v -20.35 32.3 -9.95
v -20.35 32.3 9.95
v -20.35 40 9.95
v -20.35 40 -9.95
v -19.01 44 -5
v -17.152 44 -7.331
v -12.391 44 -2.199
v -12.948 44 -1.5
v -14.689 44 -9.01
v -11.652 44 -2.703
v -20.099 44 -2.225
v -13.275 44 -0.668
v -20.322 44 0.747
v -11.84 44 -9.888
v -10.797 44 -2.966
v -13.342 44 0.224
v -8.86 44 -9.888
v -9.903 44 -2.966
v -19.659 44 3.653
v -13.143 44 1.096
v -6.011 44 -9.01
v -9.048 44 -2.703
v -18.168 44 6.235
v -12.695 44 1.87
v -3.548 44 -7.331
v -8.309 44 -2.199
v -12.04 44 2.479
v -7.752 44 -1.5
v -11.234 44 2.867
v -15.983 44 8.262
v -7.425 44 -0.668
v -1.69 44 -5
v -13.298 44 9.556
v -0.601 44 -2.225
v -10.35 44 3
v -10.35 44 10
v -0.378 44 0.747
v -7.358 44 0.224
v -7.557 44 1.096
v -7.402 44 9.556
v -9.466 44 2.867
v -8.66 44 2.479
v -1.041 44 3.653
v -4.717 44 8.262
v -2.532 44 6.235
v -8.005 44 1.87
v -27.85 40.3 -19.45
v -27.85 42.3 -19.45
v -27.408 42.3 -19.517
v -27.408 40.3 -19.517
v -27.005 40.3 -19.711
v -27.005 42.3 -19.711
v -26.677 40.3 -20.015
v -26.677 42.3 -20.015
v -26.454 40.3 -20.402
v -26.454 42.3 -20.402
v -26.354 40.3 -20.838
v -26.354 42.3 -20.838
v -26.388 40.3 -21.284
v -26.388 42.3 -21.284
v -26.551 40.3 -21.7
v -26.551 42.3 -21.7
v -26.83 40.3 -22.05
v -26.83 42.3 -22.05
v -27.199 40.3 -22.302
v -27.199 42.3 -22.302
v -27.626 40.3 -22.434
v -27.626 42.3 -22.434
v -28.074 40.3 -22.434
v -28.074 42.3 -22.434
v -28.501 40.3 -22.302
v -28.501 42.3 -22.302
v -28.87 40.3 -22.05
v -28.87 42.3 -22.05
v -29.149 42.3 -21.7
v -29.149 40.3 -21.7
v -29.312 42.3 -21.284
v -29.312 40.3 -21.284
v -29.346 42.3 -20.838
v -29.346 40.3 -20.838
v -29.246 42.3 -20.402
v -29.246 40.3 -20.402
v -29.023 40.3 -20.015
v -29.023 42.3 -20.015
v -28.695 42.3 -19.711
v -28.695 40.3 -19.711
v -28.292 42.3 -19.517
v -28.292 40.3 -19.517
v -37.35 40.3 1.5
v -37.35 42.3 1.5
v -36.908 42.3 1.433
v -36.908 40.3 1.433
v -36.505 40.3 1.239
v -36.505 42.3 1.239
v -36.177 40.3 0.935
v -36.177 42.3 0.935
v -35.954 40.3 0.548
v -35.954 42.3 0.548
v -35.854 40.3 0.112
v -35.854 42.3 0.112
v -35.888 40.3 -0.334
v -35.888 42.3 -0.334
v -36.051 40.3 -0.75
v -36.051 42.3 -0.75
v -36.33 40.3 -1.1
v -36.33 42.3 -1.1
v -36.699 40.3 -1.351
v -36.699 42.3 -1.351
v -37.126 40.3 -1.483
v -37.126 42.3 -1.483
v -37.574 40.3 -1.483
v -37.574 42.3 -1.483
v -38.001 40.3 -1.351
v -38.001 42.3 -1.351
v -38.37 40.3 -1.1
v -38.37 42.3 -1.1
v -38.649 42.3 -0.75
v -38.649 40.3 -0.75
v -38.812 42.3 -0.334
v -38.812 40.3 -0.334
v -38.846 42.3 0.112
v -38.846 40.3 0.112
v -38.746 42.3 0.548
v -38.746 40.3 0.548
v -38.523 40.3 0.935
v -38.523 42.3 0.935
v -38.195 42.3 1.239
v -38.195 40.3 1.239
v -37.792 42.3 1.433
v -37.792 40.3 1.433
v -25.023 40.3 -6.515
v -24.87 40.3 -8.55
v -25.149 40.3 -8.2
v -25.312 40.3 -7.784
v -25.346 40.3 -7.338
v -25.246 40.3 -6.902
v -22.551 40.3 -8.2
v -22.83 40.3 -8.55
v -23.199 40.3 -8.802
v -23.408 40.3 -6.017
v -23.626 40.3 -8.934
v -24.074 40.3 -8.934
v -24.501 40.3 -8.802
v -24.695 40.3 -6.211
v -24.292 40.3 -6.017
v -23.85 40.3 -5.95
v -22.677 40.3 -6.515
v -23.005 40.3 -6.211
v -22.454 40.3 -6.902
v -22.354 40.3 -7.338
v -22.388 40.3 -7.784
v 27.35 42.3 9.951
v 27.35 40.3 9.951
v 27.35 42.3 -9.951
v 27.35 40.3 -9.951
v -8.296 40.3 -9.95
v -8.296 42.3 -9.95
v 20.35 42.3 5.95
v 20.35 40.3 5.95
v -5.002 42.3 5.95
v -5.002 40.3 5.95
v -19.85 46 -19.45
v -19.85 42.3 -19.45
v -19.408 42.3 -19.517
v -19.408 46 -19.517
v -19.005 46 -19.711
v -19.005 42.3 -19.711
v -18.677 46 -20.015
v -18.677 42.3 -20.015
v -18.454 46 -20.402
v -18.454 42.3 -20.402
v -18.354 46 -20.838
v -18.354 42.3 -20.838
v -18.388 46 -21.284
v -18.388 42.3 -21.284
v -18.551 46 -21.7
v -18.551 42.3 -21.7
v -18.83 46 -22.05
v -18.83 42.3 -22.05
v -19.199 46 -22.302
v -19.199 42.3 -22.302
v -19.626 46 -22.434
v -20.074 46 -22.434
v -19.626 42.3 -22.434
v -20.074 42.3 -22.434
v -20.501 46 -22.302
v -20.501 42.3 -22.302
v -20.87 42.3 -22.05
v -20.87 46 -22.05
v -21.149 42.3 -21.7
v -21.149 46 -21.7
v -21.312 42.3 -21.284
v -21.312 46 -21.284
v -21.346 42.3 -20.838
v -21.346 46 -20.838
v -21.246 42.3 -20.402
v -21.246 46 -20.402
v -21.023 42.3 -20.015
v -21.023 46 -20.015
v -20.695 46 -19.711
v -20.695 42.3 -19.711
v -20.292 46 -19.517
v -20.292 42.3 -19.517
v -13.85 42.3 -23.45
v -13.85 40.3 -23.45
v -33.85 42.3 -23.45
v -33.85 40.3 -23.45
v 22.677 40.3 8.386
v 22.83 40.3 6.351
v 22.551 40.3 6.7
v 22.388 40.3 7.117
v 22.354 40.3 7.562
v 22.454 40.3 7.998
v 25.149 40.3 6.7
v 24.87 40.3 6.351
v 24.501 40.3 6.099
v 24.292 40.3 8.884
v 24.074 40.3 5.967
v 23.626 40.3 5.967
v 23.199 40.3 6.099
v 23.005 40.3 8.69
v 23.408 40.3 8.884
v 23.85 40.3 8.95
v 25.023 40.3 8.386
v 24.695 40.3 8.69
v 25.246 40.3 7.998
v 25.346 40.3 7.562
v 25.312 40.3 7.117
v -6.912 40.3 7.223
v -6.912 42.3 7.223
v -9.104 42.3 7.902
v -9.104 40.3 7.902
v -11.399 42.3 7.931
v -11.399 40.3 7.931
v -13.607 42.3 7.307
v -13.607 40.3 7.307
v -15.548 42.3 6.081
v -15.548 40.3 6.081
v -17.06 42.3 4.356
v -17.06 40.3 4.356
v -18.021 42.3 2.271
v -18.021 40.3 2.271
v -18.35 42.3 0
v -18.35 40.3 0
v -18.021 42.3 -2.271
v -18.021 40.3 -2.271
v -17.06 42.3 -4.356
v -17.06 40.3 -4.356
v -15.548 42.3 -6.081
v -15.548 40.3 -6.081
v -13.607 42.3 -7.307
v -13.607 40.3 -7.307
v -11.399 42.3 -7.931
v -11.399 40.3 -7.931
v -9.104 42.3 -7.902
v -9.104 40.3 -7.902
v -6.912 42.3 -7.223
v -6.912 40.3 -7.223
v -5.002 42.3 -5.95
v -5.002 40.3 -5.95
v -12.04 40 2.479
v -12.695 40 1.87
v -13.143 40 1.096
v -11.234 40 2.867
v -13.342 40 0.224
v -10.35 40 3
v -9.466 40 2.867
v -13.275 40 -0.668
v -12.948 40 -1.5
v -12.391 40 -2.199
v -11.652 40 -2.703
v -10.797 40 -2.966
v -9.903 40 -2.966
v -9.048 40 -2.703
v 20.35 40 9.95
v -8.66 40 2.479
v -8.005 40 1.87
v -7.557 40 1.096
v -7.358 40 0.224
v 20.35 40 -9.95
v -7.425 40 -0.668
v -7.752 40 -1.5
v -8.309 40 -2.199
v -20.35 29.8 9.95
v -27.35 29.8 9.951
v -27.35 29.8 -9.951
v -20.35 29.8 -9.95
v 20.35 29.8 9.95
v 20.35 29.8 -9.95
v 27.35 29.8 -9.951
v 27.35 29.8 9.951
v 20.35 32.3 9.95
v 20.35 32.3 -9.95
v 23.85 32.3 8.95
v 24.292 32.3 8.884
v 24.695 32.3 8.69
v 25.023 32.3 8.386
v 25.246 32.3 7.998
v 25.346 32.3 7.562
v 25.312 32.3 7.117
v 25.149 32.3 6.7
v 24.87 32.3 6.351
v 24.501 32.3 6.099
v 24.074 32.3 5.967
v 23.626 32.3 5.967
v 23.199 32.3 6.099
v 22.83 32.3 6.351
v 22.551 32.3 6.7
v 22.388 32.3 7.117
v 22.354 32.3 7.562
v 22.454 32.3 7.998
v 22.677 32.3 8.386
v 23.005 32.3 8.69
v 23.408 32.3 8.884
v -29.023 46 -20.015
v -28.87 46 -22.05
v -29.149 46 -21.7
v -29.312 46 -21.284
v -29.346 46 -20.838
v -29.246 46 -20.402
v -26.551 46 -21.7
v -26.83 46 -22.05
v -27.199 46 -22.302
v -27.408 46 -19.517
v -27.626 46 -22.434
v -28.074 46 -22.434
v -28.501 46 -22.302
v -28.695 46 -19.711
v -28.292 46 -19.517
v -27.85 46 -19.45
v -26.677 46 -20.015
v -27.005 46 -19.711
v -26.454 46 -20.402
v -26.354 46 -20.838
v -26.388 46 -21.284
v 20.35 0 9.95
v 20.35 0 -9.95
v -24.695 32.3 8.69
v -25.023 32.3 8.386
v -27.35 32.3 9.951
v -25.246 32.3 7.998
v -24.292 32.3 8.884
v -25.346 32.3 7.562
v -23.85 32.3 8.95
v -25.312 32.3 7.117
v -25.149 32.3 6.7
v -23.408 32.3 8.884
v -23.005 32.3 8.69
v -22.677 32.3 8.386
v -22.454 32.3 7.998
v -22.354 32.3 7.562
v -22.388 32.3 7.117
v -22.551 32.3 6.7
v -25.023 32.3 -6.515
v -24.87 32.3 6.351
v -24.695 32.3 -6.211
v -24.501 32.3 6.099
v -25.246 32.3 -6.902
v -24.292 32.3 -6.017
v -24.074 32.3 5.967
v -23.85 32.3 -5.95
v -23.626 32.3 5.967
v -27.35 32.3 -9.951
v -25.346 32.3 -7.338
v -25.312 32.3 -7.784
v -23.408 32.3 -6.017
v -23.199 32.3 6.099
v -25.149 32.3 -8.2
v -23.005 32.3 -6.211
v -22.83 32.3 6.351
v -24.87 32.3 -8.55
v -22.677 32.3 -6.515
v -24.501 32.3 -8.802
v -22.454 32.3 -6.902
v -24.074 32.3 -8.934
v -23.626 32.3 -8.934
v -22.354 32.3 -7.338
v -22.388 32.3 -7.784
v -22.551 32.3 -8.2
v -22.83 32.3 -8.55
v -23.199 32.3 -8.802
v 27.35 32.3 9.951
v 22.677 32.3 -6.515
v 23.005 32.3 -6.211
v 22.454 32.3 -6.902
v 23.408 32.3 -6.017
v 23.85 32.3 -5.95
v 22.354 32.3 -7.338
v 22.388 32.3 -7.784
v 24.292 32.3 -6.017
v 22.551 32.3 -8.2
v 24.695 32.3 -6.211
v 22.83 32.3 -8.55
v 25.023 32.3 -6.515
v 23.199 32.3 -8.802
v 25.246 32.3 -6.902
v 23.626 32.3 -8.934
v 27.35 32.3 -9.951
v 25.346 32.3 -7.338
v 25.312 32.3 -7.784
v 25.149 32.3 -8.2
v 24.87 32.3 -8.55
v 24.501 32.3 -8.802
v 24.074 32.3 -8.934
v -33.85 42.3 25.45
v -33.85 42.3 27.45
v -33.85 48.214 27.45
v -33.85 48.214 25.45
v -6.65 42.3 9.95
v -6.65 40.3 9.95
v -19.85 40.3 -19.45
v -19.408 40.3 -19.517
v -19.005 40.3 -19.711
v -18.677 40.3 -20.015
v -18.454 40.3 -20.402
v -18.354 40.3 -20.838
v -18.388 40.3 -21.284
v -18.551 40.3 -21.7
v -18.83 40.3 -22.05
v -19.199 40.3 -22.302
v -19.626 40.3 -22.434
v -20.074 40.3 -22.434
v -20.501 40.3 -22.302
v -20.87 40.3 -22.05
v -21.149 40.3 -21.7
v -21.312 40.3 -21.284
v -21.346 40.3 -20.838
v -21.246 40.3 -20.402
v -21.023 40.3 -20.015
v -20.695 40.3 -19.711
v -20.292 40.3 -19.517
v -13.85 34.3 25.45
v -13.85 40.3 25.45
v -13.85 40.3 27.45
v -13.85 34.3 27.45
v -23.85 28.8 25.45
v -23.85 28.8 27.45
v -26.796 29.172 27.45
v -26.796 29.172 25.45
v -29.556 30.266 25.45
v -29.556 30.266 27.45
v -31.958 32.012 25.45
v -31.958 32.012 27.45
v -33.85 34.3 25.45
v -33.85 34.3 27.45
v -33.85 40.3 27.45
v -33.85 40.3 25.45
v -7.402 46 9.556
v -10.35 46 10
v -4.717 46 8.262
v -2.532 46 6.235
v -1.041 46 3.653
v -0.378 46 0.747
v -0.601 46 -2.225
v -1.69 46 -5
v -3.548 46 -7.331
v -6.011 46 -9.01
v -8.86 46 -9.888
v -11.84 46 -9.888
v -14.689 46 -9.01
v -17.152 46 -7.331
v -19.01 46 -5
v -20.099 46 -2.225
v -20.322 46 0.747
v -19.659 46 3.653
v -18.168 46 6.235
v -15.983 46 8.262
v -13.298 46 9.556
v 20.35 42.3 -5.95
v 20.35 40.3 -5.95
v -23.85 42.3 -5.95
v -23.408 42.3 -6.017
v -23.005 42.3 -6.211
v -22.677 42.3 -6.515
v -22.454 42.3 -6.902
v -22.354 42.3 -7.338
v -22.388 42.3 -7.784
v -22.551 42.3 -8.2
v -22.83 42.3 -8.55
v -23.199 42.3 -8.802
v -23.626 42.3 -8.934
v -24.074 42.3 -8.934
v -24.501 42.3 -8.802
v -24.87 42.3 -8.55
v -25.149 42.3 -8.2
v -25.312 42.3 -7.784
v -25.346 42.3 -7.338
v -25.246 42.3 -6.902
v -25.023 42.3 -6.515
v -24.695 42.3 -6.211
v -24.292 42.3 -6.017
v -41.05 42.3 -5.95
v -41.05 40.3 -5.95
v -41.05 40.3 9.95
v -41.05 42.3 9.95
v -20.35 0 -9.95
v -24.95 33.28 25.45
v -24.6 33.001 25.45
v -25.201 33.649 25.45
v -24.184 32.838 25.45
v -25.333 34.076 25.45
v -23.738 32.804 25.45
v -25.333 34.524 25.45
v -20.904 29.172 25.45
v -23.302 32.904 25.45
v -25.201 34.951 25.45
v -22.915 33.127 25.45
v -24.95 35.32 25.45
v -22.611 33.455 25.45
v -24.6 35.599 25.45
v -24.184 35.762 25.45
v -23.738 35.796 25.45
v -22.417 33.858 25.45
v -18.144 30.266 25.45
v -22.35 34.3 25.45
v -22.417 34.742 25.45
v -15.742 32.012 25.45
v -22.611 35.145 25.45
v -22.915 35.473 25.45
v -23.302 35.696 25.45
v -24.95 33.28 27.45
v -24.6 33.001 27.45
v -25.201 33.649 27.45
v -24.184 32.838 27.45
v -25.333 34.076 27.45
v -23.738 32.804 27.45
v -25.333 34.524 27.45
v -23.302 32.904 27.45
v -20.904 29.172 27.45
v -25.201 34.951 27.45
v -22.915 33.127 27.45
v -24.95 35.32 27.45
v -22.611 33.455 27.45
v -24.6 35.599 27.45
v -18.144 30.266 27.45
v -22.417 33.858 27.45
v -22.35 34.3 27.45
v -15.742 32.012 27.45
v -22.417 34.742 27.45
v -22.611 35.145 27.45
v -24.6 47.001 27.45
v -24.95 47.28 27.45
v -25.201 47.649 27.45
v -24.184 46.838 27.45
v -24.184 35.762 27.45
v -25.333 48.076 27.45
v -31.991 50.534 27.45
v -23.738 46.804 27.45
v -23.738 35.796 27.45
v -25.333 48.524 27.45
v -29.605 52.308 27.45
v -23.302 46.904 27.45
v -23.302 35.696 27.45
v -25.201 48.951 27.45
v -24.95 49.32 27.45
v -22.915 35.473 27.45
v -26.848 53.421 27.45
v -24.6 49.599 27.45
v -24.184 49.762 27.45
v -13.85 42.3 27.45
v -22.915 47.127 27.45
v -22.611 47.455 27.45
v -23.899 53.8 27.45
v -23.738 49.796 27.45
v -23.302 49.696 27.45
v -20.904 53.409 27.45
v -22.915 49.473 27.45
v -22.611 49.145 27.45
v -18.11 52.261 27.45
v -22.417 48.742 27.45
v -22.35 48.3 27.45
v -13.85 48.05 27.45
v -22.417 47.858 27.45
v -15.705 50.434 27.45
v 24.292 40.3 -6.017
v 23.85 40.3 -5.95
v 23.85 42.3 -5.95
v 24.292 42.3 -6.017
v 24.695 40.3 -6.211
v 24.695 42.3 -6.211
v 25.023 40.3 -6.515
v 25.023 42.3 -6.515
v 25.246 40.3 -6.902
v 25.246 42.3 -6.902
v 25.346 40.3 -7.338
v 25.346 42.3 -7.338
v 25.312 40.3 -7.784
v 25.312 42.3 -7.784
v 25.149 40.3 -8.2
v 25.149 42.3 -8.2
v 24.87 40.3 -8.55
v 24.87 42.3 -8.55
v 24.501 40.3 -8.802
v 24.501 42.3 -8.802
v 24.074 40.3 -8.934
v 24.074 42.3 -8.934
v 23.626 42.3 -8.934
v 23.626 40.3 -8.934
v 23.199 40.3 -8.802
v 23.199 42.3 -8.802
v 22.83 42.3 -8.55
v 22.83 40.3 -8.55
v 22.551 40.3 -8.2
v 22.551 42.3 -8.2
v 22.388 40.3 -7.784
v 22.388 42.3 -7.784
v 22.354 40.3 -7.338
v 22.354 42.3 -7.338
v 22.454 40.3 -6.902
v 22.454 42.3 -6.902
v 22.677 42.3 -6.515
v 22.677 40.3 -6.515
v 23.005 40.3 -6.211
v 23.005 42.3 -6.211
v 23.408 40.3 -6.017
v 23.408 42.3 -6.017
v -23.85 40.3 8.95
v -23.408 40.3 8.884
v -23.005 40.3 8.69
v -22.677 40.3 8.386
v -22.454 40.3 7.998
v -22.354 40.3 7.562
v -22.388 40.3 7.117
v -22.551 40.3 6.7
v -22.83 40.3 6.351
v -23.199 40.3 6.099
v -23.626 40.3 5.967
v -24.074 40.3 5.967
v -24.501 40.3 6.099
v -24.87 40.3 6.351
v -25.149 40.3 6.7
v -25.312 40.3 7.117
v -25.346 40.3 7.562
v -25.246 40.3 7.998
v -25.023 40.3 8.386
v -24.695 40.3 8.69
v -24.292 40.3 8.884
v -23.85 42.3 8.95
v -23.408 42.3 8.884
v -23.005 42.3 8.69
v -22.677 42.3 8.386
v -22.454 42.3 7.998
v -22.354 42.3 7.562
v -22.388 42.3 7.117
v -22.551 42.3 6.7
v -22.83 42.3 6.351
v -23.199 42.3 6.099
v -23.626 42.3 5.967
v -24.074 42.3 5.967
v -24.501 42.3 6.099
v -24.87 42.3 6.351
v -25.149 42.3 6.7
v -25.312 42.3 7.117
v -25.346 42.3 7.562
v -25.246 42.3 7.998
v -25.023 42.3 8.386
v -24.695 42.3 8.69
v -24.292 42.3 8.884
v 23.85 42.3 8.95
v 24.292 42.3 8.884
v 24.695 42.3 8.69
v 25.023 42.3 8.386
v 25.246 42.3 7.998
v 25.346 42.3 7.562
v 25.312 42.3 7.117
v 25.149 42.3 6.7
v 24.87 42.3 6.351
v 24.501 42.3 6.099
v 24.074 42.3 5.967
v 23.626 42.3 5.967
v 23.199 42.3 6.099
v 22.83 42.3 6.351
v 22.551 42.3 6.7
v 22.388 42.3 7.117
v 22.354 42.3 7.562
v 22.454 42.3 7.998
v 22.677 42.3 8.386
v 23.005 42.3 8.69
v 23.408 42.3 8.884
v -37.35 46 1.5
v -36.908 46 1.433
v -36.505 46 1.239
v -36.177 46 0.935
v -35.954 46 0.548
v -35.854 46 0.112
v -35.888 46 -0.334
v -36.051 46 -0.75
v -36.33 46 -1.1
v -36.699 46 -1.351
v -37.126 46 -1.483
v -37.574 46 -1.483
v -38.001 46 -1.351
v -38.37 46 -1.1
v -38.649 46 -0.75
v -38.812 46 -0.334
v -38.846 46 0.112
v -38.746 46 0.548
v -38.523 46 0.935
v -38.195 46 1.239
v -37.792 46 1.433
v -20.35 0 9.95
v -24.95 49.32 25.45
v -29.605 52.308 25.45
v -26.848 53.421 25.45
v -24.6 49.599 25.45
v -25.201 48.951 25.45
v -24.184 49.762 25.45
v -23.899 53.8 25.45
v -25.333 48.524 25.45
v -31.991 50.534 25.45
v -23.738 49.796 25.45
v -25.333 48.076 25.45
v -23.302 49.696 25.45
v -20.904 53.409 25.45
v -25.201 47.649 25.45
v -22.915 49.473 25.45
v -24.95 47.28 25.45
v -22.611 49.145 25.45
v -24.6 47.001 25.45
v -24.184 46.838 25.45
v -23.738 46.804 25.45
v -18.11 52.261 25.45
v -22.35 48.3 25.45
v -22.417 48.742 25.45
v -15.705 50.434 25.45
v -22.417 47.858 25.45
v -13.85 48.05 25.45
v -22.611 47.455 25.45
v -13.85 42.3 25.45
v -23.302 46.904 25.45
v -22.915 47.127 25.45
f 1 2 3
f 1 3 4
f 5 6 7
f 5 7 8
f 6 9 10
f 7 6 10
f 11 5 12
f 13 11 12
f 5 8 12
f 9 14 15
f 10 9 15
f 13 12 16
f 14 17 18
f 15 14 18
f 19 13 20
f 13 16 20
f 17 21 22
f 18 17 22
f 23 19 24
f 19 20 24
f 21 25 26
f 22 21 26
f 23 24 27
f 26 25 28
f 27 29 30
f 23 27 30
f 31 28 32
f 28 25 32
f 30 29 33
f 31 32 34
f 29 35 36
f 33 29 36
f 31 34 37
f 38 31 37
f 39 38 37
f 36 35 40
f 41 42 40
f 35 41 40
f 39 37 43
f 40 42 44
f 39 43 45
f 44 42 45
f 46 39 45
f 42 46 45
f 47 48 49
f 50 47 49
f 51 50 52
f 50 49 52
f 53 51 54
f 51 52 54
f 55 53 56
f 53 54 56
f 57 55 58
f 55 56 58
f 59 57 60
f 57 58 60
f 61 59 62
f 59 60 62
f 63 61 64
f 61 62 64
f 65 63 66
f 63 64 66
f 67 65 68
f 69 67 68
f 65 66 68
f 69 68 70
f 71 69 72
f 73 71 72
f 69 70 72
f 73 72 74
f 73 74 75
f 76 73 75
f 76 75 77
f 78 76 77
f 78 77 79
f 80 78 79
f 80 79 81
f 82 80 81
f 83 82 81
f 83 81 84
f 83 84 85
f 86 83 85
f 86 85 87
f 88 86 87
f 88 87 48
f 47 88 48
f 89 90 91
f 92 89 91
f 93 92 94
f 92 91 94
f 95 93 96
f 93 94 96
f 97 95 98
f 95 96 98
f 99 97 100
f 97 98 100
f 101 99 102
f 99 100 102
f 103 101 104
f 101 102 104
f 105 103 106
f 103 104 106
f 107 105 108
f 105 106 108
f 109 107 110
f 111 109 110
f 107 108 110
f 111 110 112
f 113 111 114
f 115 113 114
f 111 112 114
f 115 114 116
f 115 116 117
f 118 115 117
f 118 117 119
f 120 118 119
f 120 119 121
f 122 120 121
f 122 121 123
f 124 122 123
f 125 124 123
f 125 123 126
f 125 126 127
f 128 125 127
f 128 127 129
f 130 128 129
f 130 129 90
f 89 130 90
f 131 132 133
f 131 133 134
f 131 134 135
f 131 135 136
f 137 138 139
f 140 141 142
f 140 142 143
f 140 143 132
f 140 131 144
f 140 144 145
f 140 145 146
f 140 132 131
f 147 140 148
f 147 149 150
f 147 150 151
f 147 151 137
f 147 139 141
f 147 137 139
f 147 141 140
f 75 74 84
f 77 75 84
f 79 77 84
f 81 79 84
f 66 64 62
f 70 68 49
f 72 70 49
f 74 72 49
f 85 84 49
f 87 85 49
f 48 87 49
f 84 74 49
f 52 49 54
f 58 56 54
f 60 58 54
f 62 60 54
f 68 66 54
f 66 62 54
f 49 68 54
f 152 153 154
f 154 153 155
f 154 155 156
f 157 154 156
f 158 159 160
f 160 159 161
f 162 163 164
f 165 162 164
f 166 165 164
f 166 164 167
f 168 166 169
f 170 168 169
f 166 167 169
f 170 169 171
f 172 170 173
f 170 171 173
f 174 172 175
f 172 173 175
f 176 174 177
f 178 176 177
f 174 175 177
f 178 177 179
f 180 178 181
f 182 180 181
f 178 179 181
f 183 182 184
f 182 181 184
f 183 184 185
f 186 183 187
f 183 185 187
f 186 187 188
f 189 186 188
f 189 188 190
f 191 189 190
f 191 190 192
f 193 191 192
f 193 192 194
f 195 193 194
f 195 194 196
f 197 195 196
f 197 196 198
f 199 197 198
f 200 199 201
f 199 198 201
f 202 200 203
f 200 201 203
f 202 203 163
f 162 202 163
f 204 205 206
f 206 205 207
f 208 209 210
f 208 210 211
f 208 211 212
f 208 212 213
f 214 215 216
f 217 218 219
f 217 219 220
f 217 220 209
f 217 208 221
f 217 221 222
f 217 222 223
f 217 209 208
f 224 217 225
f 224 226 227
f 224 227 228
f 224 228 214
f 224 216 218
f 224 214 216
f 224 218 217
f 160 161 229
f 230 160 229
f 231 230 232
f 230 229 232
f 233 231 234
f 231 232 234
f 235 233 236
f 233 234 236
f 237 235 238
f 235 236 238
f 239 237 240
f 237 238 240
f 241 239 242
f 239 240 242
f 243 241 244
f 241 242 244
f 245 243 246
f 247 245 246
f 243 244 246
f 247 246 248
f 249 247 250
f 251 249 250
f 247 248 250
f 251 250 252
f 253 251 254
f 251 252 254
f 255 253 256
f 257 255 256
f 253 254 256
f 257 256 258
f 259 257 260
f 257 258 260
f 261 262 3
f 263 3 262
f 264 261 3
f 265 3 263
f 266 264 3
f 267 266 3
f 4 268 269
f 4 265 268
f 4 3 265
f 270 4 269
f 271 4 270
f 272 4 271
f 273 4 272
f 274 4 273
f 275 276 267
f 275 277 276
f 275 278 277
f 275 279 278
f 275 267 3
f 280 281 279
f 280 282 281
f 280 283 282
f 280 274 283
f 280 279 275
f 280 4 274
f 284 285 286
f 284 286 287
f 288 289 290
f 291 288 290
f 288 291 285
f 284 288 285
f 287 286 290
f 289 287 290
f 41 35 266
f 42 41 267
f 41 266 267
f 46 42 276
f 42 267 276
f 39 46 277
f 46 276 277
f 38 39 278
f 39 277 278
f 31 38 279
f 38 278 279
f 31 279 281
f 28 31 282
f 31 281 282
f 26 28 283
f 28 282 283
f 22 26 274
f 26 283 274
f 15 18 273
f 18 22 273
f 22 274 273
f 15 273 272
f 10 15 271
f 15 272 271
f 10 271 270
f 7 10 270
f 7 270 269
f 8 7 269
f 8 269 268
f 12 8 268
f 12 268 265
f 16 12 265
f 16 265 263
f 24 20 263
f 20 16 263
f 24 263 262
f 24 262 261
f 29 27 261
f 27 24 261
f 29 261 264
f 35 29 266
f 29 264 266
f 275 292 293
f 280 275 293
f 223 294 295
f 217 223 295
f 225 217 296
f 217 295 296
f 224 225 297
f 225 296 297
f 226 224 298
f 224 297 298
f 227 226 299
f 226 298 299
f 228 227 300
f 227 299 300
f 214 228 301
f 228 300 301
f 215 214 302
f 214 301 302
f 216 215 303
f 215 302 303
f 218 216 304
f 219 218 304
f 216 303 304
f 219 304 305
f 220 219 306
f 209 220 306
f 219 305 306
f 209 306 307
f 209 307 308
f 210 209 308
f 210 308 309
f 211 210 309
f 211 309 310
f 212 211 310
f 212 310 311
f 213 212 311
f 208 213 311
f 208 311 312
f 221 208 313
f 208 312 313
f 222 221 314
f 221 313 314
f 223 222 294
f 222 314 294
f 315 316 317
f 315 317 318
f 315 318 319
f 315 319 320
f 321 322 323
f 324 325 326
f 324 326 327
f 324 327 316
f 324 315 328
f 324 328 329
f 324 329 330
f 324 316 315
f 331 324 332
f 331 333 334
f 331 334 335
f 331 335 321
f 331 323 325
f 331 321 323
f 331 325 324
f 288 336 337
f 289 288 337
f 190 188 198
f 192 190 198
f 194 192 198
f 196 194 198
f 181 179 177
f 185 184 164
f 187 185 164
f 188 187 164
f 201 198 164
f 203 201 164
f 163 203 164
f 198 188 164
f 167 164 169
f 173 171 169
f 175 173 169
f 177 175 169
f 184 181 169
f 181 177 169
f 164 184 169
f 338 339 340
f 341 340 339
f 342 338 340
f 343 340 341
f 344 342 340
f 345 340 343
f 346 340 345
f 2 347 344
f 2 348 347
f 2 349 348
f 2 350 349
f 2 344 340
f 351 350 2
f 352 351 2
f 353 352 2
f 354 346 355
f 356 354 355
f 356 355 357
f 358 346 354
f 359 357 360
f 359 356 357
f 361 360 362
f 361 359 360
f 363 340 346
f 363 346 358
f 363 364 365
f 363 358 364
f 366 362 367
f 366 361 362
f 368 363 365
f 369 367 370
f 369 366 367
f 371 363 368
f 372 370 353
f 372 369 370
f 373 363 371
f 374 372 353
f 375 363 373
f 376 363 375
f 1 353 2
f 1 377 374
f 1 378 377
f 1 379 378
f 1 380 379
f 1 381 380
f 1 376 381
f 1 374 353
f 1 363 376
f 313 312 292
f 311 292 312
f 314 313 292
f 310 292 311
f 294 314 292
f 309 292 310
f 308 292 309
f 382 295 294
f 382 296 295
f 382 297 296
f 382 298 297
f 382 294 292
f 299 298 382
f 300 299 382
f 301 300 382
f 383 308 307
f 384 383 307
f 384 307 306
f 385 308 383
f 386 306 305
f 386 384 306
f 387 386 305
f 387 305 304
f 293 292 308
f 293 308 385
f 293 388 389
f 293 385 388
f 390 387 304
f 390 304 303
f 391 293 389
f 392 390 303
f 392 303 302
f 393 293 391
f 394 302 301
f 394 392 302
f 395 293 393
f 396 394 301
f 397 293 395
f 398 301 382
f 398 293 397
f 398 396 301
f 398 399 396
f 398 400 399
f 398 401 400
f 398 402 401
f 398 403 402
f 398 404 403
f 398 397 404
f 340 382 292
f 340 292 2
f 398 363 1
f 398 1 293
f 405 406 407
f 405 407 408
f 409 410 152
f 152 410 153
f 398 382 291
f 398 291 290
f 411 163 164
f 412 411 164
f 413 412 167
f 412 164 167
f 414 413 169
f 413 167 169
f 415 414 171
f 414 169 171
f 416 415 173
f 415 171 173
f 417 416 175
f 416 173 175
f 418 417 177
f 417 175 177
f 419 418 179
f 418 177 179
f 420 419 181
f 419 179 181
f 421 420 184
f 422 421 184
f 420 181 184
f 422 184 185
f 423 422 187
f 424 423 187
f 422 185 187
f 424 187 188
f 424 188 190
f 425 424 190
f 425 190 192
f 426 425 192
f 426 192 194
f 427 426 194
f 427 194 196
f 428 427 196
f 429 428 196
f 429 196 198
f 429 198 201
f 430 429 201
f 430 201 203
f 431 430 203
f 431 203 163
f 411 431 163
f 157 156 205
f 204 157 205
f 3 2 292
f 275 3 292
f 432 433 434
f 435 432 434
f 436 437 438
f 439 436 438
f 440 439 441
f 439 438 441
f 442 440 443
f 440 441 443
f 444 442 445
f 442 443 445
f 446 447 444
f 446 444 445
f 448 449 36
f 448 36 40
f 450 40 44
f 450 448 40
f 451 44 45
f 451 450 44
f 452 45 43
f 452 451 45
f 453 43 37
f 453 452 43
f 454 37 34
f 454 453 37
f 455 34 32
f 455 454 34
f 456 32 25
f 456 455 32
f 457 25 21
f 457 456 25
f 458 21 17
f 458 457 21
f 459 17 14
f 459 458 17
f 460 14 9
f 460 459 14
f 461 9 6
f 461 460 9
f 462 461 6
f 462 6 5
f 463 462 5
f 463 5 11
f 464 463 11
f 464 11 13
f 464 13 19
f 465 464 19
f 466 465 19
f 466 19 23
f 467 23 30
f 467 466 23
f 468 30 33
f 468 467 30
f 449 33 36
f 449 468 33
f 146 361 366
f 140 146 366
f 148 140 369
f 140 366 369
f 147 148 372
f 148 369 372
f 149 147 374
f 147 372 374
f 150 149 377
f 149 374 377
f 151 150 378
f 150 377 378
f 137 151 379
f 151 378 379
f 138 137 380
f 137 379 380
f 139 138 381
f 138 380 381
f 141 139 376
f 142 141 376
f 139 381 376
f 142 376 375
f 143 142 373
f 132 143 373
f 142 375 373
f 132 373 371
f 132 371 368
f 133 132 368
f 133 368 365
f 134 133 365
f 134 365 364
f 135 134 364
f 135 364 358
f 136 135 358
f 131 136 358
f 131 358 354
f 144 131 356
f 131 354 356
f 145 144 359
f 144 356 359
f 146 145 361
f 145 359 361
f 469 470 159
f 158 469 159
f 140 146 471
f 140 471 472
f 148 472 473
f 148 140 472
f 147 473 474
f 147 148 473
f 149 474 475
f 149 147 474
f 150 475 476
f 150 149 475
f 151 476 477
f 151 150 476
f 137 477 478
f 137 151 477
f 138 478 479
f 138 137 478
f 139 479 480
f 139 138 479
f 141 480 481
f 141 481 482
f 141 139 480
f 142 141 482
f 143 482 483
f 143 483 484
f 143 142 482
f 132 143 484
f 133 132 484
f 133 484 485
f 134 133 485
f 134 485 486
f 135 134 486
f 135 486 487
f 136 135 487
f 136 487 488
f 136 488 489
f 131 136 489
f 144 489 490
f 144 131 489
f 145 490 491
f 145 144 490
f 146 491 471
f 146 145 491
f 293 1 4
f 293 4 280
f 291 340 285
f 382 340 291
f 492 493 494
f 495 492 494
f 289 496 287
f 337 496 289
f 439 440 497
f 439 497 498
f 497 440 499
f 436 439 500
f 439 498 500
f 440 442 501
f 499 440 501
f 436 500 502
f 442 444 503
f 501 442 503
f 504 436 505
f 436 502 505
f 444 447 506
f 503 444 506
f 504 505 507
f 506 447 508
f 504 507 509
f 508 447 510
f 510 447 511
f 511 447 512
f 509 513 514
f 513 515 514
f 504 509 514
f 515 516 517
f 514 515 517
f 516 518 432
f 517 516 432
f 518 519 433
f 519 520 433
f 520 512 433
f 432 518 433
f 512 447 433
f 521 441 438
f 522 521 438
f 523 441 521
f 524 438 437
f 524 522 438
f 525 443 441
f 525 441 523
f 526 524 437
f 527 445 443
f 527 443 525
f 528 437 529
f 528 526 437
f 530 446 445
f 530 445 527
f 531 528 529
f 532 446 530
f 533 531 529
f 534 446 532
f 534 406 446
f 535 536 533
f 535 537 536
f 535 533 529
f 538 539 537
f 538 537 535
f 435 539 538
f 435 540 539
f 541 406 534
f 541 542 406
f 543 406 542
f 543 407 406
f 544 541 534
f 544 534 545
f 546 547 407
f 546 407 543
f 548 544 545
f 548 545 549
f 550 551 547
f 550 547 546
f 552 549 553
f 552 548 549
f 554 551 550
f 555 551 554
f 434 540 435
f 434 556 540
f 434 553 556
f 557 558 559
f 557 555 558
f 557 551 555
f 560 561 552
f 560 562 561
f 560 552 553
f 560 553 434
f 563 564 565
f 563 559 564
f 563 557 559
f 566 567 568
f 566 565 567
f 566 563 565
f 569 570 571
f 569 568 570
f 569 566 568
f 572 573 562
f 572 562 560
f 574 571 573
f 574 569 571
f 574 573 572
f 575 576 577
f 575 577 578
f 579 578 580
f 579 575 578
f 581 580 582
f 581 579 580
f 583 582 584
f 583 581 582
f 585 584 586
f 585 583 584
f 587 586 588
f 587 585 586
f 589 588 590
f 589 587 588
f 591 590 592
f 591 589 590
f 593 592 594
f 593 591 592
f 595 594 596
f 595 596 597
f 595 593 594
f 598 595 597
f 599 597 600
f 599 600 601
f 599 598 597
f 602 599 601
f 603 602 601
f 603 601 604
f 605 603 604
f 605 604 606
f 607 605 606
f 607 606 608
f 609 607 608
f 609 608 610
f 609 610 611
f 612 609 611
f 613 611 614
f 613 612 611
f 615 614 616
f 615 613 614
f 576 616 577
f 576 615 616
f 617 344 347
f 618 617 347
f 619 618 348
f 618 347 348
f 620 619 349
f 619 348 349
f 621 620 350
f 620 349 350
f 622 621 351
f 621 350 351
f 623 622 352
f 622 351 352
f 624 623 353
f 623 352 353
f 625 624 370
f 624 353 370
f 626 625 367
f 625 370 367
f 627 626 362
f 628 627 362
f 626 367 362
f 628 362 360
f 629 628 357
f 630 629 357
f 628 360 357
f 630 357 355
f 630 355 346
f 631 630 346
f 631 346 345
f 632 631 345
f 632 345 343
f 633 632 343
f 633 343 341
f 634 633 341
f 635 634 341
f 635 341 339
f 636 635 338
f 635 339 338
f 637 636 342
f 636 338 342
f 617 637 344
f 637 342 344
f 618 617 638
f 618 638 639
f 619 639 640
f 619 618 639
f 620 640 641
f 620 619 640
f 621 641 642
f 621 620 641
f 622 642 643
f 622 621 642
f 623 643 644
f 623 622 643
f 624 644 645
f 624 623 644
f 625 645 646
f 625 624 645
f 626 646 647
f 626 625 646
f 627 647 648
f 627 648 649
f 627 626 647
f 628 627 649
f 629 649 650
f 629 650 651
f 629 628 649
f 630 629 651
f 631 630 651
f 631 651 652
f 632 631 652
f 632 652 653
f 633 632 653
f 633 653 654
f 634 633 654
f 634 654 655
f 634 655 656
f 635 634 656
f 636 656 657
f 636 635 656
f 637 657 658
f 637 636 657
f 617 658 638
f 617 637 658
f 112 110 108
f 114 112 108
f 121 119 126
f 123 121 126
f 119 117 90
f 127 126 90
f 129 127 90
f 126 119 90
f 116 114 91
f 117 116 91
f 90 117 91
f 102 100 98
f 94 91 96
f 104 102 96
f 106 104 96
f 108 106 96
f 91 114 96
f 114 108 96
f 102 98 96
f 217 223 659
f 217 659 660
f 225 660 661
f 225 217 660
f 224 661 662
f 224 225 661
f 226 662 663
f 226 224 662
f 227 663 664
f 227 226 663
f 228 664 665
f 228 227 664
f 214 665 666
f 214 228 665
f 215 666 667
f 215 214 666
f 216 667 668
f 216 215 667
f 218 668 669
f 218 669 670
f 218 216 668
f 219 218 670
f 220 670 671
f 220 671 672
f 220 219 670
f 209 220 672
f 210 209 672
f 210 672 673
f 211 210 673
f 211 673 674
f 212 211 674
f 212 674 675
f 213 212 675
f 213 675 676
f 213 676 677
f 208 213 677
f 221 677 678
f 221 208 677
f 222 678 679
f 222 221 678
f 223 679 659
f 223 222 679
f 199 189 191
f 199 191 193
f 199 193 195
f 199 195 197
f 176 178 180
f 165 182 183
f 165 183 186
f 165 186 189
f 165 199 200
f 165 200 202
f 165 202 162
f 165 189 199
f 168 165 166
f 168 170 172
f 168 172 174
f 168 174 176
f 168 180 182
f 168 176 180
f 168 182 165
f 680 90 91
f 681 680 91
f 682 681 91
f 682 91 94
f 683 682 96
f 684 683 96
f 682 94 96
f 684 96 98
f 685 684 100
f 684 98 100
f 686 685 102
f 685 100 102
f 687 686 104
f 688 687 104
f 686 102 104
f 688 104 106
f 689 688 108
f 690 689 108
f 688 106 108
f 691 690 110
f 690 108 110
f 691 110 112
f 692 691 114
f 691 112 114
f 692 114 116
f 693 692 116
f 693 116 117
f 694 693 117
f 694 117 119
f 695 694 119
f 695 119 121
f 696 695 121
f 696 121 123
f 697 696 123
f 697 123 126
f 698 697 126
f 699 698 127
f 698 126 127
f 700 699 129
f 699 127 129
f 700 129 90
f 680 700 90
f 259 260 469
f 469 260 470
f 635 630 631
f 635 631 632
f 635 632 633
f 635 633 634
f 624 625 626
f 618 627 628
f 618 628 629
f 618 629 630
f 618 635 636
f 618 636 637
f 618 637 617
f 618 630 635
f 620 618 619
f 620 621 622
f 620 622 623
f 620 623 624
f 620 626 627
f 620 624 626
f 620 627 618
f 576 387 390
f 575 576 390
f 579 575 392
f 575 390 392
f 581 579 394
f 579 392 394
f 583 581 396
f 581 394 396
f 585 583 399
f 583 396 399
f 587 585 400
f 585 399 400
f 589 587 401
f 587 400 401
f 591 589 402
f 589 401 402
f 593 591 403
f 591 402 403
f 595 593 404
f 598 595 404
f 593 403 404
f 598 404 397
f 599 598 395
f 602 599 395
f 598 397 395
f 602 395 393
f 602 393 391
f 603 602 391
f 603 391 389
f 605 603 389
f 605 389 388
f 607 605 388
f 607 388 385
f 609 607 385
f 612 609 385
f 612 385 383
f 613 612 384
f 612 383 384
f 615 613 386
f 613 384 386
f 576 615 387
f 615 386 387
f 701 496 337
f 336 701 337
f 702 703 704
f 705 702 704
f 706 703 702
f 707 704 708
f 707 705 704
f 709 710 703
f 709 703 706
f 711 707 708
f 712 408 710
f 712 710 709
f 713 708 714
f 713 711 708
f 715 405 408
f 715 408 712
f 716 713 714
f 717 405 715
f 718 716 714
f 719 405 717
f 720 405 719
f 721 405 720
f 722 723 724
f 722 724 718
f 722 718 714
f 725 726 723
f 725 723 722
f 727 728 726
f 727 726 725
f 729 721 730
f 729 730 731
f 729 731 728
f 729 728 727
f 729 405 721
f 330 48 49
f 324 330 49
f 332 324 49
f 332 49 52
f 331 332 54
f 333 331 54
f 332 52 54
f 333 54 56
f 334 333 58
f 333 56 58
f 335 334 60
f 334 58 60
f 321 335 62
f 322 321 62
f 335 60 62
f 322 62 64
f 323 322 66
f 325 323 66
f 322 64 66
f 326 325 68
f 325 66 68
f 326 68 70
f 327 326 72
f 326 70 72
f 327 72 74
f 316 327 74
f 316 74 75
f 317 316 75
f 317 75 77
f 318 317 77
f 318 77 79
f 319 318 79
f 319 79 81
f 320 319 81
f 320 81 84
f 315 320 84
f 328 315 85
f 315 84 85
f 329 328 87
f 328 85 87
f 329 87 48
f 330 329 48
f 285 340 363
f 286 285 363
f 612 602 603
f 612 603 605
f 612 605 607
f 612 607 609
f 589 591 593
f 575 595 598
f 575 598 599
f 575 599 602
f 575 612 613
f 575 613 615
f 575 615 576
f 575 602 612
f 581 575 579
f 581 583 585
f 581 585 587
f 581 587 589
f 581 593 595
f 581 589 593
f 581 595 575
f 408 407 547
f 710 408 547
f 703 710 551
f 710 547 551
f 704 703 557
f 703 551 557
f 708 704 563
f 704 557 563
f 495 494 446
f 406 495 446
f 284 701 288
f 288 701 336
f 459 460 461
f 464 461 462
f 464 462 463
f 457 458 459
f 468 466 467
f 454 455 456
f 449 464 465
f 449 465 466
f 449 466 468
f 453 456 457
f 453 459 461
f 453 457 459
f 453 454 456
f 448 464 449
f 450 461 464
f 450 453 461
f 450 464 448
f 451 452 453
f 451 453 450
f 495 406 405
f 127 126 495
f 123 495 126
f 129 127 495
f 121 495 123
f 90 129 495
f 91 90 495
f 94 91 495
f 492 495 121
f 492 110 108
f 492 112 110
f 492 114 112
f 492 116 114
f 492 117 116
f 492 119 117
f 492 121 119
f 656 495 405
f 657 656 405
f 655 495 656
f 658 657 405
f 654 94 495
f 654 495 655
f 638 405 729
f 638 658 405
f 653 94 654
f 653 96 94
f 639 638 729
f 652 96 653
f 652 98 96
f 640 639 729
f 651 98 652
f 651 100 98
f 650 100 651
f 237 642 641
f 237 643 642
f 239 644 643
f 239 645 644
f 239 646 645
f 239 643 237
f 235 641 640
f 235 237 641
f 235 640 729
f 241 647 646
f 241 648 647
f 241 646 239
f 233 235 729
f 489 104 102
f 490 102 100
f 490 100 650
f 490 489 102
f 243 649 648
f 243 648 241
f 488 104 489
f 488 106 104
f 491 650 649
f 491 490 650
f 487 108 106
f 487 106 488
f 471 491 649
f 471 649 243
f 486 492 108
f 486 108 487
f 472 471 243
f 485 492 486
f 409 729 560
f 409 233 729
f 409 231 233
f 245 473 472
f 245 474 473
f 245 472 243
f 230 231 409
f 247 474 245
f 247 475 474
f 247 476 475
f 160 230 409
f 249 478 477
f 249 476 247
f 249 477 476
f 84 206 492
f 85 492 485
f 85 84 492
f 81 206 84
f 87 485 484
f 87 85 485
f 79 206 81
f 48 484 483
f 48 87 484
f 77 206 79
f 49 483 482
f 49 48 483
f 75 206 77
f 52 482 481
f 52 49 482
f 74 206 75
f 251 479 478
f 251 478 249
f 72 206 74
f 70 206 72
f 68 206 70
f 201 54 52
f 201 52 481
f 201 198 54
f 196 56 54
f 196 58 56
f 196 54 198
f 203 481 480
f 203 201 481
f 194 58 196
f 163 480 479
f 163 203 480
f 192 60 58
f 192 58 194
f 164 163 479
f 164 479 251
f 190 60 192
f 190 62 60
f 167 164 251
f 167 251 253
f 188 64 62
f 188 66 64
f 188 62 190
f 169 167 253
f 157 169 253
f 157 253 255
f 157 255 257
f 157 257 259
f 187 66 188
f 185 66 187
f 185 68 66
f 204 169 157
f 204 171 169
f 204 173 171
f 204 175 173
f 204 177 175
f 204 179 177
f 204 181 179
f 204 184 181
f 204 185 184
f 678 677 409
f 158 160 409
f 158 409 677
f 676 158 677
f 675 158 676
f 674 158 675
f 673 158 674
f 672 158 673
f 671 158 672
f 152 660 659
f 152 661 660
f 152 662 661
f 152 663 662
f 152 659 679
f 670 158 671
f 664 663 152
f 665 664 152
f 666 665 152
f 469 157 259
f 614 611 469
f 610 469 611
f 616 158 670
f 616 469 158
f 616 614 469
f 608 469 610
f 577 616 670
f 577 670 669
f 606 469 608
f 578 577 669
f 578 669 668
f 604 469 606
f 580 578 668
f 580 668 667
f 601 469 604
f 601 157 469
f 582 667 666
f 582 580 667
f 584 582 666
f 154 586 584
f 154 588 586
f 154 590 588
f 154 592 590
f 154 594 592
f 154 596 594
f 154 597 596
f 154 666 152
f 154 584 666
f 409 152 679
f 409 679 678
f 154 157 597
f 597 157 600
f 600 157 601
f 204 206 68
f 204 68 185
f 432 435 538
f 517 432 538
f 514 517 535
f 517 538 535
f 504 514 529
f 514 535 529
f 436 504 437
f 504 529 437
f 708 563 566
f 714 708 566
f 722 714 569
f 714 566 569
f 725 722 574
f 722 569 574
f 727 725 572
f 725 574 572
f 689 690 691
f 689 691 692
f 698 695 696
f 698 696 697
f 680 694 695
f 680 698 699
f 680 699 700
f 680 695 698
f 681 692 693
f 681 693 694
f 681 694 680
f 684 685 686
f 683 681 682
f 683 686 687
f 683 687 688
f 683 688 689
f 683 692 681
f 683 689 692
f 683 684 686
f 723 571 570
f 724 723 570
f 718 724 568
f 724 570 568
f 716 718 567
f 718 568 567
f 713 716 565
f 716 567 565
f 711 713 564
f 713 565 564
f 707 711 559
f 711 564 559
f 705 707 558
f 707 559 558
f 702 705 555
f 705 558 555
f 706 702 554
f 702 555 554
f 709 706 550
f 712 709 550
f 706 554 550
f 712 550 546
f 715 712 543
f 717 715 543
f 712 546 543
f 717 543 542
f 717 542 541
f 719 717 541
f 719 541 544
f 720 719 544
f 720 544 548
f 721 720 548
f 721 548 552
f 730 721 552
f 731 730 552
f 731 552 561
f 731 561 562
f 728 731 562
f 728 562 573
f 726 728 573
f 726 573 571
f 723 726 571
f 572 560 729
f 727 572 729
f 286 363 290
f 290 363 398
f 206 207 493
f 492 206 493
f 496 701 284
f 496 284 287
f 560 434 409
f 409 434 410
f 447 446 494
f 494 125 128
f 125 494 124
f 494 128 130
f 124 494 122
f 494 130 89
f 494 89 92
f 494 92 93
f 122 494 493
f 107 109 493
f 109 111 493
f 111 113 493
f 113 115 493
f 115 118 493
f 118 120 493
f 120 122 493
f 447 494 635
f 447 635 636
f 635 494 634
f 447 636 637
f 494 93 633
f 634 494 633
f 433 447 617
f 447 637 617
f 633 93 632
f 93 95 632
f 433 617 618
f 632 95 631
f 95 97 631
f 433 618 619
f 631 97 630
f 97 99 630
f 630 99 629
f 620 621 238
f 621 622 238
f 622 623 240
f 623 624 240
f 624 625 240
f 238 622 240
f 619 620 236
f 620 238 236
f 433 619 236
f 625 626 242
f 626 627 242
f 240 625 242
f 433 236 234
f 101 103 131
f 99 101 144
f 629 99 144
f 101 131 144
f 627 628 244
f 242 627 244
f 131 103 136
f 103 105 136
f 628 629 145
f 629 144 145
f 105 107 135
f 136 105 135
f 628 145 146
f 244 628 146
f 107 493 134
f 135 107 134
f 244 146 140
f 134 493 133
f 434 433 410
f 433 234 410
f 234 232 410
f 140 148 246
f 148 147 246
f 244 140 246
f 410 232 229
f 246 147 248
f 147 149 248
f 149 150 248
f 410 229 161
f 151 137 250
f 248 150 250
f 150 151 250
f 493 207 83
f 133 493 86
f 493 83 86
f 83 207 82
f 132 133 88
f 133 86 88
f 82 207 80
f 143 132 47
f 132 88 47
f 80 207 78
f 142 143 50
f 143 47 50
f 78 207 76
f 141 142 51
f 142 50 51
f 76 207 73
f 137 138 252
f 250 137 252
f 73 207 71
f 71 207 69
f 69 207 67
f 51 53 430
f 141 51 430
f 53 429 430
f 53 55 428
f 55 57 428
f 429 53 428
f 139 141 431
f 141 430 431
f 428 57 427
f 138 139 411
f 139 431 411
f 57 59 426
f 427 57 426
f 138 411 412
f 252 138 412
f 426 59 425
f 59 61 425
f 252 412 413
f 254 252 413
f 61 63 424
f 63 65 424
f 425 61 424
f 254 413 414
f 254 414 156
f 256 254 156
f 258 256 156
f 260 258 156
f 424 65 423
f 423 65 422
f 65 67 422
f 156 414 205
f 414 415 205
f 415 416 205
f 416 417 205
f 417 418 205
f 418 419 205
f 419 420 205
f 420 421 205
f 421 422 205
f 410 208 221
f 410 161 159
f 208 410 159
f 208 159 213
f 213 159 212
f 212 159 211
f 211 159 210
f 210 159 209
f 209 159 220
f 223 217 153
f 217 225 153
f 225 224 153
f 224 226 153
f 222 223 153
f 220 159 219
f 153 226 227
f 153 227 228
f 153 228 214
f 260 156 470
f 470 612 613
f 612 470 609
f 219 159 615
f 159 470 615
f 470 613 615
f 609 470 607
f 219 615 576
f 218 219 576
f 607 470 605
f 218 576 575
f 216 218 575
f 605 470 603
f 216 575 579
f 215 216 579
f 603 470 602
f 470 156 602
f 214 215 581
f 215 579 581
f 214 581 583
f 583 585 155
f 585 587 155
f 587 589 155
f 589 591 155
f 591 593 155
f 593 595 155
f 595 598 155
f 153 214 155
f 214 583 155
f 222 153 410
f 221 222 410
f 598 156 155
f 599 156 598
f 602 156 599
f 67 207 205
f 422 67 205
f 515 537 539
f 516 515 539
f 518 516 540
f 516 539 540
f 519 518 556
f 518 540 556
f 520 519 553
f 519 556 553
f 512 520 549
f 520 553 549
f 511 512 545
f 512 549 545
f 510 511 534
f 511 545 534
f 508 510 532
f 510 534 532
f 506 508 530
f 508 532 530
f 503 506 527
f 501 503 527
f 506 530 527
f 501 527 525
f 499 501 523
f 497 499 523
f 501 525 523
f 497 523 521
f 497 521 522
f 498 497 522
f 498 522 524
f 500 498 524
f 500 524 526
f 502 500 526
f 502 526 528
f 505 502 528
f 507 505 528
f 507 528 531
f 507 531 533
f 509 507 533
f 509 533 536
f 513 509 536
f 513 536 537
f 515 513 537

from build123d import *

# Parameters (mm, degrees)
SKETCH_1_W          = 40.7
SKETCH_1_H          = 19.9
EXTRUDE_1_DEPTH     = 40
SKETCH_2_R          = 3
EXTRUDE_2_DEPTH     = 6
EXTRUDE_START       = -7.7
SKETCH_3_W          = 54.7
SKETCH_3_H          = 19.901230414
EXTRUDE_3_DEPTH     = 2.5
SKETCH_4_R          = 10
EXTRUDE_4_DEPTH     = 2
SKETCH_5_R          = 1.5
EXTRUDE_5_DEPTH     = 8
SKETCH_7_R          = 1.5
EXTRUDE_6_DEPTH     = 2
SKETCH_8_W          = 20
SKETCH_8_H          = 2
EXTRUDE_7_DEPTH     = 11.5
SKETCH_9_W          = 20
SKETCH_9_H          = 2
EXTRUDE_8_DEPTH     = 11.5
SKETCH_10_R         = 1.5
CUT_EXTRUDE_1_DEPTH = 6.5
SKETCH_11_R         = 1.5
CUT_EXTRUDE_2_DEPTH = 6.5
CUT_EXTRUDE_3_DEPTH = 6.5
SKETCH_15_R         = 1.5
EXTRUDE_9_DEPTH     = 3.7
EXTRUDE_9_2_DEPTH   = 3.7
EXTRUDE_9_3_DEPTH   = 3.7


with BuildPart() as part:
    # 스케치1 → 보스-돌출1 (new body)
    with BuildSketch(Plane(origin=(0, 0, 0), x_dir=(1, 0, 0), z_dir=(0, 1, 0))):
        Rectangle(SKETCH_1_W, SKETCH_1_H)
    extrude(amount=EXTRUDE_1_DEPTH)

    # 스케치2 → 보스-돌출2 (add)
    with BuildSketch(Plane(origin=(0, 40, 0), x_dir=(1, 0, 0), z_dir=(0, 1, 0))):
        with Locations(Location((-10.35, 0, 0), (0, 0, 270))):
            Circle(SKETCH_2_R)
    extrude(amount=EXTRUDE_2_DEPTH)

    # 스케치3 → 보스-돌출3 (add)
    with BuildSketch(Plane(origin=(0, 40, 0), x_dir=(1, 0, 0), z_dir=(0, 1, 0)).offset(EXTRUDE_START)):
        Rectangle(SKETCH_3_W, SKETCH_3_H)
    extrude(amount=-EXTRUDE_3_DEPTH)

    # 스케치4 → 보스-돌출4 (add)
    with BuildSketch(Plane(origin=(0, 46, 0), x_dir=(1, 0, 0), z_dir=(0, 1, 0))):
        with Locations(Location((-10.35, 0, 0), (0, 0, 270))):
            Circle(SKETCH_4_R)
    extrude(amount=-EXTRUDE_4_DEPTH)

    # 스케치5 → 보스-돌출5 (add)
    with BuildSketch(Plane(origin=(0, 32.3, 0), x_dir=(1, 0, 0), z_dir=(0, 1, 0))):
        with Locations(Location((23.85, -7.450307604, 0), (0, 0, 270))):
            Circle(SKETCH_5_R)
        with Locations(Location((23.85, 7.450307604, 0), (0, 0, 270))):
            Circle(SKETCH_5_R)
        with Locations(Location((-23.85, -7.450307604, 0), (0, 0, 270))):
            Circle(SKETCH_5_R)
        with Locations(Location((-23.85, 7.450307604, 0), (0, 0, 270))):
            Circle(SKETCH_5_R)
    extrude(amount=EXTRUDE_5_DEPTH)


with BuildPart() as body_2:
    # 스케치7 → 보스-돌출6 (new body)
    with BuildSketch(Plane(origin=(0, 40.3, 0), x_dir=(1, 0, 0), z_dir=(0, 1, 0))):
        Polygon((27.35, -9.950615207), (27.35, 9.950615207), (-8.295701036, 9.950038115), (-13.85, 23.450307604), (-33.85, 23.450307604), (-41.050000006, 5.95), (-41.050000006, -9.95), (-33.85, -27.450307604), (-13.85, -27.450307604), (-6.649999994, -9.95), align=None)
        with Locations(Location((-23.85, -7.450307604, 0), (0, 0, 270))):
            Circle(SKETCH_7_R, mode=Mode.SUBTRACT)
        with Locations(Location((-23.85, 7.450307604, 0), (0, 0, 270))):
            Circle(SKETCH_7_R, mode=Mode.SUBTRACT)
        with Locations(Location((23.85, 7.450307604, 0), (0, 0, 270))):
            Circle(SKETCH_7_R, mode=Mode.SUBTRACT)
        with Locations(Location((23.85, -7.450307604, 0), (0, 0, 270))):
            Circle(SKETCH_7_R, mode=Mode.SUBTRACT)
        with BuildLine():
            Line((20.35, -5.95), (-5.002336959, -5.95))
            ThreePointArc((-5.002336959, -5.95), (-18.35, 0), (-5.002336959, 5.95))
            Line((-5.002336959, 5.95), (20.35, 5.95))
            Line((20.35, 5.95), (20.35, -5.95))
        make_face(mode=Mode.SUBTRACT)
    extrude(amount=EXTRUDE_6_DEPTH)

    # 스케치8 → 보스-돌출7 (add)
    with BuildSketch(Plane(origin=(0, 42.3, 0), x_dir=(1, 0, 0), z_dir=(0, 1, 0))):
        with Locations((-23.85, -26.450307604)):
            Rectangle(SKETCH_8_W, SKETCH_8_H)
    extrude(amount=EXTRUDE_7_DEPTH)

    # 스케치9 → 보스-돌출8 (add)
    with BuildSketch(Plane.XZ.offset(-40.3)):
        with Locations((-23.85, 26.450307604)):
            Rectangle(SKETCH_9_W, SKETCH_9_H)
    extrude(amount=EXTRUDE_8_DEPTH)

    # 스케치10 → 컷-돌출1 (cut)
    with BuildSketch(Plane.XY.offset(27.450307604)):
        with Locations((-23.85, 48.3)):
            Circle(SKETCH_10_R)
        with Locations((-23.85, 34.3)):
            Circle(SKETCH_10_R)
    extrude(amount=-CUT_EXTRUDE_1_DEPTH, mode=Mode.SUBTRACT)

    # 스케치11 → 컷-돌출2 (cut)
    with BuildSketch(Plane(origin=(0, 42.3, 0), x_dir=(1, 0, 0), z_dir=(0, 1, 0))):
        with Locations(Location((-37.35, 0, 0), (0, 0, 270))):
            Circle(SKETCH_11_R)
        with Locations(Location((-27.85, 20.950307604, 0), (0, 0, 270))):
            Circle(SKETCH_11_R)
        with Locations(Location((-19.85, 20.950307604, 0), (0, 0, 270))):
            Circle(SKETCH_11_R)
    extrude(amount=-CUT_EXTRUDE_2_DEPTH, mode=Mode.SUBTRACT)

    # 스케치12 → 컷-돌출3 (cut)
    with BuildSketch(Plane.XY.offset(27.450307604)):
        with BuildLine():
            ThreePointArc((-23.85, 28.8), (-29.556356105, 30.265716172), (-33.85, 34.3))
            Line((-33.85, 34.3), (-33.85, 28.8))
            Line((-33.85, 28.8), (-23.85, 28.8))
        make_face()
        with BuildLine():
            ThreePointArc((-13.85, 34.3), (-18.143643895, 30.265716172), (-23.85, 28.8))
            Line((-23.85, 28.8), (-13.85, 28.8))
            Line((-13.85, 28.8), (-13.85, 34.3))
        make_face()
        with BuildLine():
            Line((-33.85, 53.8), (-33.85, 48.213933245))
            ThreePointArc((-33.85, 48.213933245), (-29.604889153, 52.307994376), (-23.899083174, 53.8))
            Line((-23.899083174, 53.8), (-33.85, 53.8))
        make_face()
        with BuildLine():
            Line((-13.85, 53.8), (-23.899083174, 53.8))
            ThreePointArc((-23.899083174, 53.8), (-18.110158994, 52.260885957), (-13.85, 48.05))
            Line((-13.85, 48.05), (-13.85, 53.8))
        make_face()
    extrude(amount=-CUT_EXTRUDE_3_DEPTH, mode=Mode.SUBTRACT)


with BuildPart() as body_3:
    # 스케치15 → 보스-돌출9 (new body)
    with BuildSketch(Plane(origin=(0, 42.3, 0), x_dir=(1, 0, 0), z_dir=(0, 1, 0))):
        with Locations(Location((-27.85, 20.950307604, 0), (0, 0, 270))):
            Circle(SKETCH_15_R)
    extrude(amount=EXTRUDE_9_DEPTH)


with BuildPart() as body_4:
    # 스케치15 → Extrude 9 2 (new body)
    with BuildSketch(Plane(origin=(0, 42.3, 0), x_dir=(1, 0, 0), z_dir=(0, 1, 0))):
        with Locations(Location((-19.85, 20.950307604, 0), (0, 0, 270))):
            Circle(SKETCH_15_R)
    extrude(amount=EXTRUDE_9_2_DEPTH)


with BuildPart() as body_5:
    # 스케치15 → Extrude 9 3 (new body)
    with BuildSketch(Plane(origin=(0, 42.3, 0), x_dir=(1, 0, 0), z_dir=(0, 1, 0))):
        with Locations(Location((-37.35, 0, 0), (0, 0, 270))):
            Circle(SKETCH_15_R)
    extrude(amount=EXTRUDE_9_3_DEPTH)


solid = Compound([part.part, body_2.part, body_3.part, body_4.part, body_5.part])
